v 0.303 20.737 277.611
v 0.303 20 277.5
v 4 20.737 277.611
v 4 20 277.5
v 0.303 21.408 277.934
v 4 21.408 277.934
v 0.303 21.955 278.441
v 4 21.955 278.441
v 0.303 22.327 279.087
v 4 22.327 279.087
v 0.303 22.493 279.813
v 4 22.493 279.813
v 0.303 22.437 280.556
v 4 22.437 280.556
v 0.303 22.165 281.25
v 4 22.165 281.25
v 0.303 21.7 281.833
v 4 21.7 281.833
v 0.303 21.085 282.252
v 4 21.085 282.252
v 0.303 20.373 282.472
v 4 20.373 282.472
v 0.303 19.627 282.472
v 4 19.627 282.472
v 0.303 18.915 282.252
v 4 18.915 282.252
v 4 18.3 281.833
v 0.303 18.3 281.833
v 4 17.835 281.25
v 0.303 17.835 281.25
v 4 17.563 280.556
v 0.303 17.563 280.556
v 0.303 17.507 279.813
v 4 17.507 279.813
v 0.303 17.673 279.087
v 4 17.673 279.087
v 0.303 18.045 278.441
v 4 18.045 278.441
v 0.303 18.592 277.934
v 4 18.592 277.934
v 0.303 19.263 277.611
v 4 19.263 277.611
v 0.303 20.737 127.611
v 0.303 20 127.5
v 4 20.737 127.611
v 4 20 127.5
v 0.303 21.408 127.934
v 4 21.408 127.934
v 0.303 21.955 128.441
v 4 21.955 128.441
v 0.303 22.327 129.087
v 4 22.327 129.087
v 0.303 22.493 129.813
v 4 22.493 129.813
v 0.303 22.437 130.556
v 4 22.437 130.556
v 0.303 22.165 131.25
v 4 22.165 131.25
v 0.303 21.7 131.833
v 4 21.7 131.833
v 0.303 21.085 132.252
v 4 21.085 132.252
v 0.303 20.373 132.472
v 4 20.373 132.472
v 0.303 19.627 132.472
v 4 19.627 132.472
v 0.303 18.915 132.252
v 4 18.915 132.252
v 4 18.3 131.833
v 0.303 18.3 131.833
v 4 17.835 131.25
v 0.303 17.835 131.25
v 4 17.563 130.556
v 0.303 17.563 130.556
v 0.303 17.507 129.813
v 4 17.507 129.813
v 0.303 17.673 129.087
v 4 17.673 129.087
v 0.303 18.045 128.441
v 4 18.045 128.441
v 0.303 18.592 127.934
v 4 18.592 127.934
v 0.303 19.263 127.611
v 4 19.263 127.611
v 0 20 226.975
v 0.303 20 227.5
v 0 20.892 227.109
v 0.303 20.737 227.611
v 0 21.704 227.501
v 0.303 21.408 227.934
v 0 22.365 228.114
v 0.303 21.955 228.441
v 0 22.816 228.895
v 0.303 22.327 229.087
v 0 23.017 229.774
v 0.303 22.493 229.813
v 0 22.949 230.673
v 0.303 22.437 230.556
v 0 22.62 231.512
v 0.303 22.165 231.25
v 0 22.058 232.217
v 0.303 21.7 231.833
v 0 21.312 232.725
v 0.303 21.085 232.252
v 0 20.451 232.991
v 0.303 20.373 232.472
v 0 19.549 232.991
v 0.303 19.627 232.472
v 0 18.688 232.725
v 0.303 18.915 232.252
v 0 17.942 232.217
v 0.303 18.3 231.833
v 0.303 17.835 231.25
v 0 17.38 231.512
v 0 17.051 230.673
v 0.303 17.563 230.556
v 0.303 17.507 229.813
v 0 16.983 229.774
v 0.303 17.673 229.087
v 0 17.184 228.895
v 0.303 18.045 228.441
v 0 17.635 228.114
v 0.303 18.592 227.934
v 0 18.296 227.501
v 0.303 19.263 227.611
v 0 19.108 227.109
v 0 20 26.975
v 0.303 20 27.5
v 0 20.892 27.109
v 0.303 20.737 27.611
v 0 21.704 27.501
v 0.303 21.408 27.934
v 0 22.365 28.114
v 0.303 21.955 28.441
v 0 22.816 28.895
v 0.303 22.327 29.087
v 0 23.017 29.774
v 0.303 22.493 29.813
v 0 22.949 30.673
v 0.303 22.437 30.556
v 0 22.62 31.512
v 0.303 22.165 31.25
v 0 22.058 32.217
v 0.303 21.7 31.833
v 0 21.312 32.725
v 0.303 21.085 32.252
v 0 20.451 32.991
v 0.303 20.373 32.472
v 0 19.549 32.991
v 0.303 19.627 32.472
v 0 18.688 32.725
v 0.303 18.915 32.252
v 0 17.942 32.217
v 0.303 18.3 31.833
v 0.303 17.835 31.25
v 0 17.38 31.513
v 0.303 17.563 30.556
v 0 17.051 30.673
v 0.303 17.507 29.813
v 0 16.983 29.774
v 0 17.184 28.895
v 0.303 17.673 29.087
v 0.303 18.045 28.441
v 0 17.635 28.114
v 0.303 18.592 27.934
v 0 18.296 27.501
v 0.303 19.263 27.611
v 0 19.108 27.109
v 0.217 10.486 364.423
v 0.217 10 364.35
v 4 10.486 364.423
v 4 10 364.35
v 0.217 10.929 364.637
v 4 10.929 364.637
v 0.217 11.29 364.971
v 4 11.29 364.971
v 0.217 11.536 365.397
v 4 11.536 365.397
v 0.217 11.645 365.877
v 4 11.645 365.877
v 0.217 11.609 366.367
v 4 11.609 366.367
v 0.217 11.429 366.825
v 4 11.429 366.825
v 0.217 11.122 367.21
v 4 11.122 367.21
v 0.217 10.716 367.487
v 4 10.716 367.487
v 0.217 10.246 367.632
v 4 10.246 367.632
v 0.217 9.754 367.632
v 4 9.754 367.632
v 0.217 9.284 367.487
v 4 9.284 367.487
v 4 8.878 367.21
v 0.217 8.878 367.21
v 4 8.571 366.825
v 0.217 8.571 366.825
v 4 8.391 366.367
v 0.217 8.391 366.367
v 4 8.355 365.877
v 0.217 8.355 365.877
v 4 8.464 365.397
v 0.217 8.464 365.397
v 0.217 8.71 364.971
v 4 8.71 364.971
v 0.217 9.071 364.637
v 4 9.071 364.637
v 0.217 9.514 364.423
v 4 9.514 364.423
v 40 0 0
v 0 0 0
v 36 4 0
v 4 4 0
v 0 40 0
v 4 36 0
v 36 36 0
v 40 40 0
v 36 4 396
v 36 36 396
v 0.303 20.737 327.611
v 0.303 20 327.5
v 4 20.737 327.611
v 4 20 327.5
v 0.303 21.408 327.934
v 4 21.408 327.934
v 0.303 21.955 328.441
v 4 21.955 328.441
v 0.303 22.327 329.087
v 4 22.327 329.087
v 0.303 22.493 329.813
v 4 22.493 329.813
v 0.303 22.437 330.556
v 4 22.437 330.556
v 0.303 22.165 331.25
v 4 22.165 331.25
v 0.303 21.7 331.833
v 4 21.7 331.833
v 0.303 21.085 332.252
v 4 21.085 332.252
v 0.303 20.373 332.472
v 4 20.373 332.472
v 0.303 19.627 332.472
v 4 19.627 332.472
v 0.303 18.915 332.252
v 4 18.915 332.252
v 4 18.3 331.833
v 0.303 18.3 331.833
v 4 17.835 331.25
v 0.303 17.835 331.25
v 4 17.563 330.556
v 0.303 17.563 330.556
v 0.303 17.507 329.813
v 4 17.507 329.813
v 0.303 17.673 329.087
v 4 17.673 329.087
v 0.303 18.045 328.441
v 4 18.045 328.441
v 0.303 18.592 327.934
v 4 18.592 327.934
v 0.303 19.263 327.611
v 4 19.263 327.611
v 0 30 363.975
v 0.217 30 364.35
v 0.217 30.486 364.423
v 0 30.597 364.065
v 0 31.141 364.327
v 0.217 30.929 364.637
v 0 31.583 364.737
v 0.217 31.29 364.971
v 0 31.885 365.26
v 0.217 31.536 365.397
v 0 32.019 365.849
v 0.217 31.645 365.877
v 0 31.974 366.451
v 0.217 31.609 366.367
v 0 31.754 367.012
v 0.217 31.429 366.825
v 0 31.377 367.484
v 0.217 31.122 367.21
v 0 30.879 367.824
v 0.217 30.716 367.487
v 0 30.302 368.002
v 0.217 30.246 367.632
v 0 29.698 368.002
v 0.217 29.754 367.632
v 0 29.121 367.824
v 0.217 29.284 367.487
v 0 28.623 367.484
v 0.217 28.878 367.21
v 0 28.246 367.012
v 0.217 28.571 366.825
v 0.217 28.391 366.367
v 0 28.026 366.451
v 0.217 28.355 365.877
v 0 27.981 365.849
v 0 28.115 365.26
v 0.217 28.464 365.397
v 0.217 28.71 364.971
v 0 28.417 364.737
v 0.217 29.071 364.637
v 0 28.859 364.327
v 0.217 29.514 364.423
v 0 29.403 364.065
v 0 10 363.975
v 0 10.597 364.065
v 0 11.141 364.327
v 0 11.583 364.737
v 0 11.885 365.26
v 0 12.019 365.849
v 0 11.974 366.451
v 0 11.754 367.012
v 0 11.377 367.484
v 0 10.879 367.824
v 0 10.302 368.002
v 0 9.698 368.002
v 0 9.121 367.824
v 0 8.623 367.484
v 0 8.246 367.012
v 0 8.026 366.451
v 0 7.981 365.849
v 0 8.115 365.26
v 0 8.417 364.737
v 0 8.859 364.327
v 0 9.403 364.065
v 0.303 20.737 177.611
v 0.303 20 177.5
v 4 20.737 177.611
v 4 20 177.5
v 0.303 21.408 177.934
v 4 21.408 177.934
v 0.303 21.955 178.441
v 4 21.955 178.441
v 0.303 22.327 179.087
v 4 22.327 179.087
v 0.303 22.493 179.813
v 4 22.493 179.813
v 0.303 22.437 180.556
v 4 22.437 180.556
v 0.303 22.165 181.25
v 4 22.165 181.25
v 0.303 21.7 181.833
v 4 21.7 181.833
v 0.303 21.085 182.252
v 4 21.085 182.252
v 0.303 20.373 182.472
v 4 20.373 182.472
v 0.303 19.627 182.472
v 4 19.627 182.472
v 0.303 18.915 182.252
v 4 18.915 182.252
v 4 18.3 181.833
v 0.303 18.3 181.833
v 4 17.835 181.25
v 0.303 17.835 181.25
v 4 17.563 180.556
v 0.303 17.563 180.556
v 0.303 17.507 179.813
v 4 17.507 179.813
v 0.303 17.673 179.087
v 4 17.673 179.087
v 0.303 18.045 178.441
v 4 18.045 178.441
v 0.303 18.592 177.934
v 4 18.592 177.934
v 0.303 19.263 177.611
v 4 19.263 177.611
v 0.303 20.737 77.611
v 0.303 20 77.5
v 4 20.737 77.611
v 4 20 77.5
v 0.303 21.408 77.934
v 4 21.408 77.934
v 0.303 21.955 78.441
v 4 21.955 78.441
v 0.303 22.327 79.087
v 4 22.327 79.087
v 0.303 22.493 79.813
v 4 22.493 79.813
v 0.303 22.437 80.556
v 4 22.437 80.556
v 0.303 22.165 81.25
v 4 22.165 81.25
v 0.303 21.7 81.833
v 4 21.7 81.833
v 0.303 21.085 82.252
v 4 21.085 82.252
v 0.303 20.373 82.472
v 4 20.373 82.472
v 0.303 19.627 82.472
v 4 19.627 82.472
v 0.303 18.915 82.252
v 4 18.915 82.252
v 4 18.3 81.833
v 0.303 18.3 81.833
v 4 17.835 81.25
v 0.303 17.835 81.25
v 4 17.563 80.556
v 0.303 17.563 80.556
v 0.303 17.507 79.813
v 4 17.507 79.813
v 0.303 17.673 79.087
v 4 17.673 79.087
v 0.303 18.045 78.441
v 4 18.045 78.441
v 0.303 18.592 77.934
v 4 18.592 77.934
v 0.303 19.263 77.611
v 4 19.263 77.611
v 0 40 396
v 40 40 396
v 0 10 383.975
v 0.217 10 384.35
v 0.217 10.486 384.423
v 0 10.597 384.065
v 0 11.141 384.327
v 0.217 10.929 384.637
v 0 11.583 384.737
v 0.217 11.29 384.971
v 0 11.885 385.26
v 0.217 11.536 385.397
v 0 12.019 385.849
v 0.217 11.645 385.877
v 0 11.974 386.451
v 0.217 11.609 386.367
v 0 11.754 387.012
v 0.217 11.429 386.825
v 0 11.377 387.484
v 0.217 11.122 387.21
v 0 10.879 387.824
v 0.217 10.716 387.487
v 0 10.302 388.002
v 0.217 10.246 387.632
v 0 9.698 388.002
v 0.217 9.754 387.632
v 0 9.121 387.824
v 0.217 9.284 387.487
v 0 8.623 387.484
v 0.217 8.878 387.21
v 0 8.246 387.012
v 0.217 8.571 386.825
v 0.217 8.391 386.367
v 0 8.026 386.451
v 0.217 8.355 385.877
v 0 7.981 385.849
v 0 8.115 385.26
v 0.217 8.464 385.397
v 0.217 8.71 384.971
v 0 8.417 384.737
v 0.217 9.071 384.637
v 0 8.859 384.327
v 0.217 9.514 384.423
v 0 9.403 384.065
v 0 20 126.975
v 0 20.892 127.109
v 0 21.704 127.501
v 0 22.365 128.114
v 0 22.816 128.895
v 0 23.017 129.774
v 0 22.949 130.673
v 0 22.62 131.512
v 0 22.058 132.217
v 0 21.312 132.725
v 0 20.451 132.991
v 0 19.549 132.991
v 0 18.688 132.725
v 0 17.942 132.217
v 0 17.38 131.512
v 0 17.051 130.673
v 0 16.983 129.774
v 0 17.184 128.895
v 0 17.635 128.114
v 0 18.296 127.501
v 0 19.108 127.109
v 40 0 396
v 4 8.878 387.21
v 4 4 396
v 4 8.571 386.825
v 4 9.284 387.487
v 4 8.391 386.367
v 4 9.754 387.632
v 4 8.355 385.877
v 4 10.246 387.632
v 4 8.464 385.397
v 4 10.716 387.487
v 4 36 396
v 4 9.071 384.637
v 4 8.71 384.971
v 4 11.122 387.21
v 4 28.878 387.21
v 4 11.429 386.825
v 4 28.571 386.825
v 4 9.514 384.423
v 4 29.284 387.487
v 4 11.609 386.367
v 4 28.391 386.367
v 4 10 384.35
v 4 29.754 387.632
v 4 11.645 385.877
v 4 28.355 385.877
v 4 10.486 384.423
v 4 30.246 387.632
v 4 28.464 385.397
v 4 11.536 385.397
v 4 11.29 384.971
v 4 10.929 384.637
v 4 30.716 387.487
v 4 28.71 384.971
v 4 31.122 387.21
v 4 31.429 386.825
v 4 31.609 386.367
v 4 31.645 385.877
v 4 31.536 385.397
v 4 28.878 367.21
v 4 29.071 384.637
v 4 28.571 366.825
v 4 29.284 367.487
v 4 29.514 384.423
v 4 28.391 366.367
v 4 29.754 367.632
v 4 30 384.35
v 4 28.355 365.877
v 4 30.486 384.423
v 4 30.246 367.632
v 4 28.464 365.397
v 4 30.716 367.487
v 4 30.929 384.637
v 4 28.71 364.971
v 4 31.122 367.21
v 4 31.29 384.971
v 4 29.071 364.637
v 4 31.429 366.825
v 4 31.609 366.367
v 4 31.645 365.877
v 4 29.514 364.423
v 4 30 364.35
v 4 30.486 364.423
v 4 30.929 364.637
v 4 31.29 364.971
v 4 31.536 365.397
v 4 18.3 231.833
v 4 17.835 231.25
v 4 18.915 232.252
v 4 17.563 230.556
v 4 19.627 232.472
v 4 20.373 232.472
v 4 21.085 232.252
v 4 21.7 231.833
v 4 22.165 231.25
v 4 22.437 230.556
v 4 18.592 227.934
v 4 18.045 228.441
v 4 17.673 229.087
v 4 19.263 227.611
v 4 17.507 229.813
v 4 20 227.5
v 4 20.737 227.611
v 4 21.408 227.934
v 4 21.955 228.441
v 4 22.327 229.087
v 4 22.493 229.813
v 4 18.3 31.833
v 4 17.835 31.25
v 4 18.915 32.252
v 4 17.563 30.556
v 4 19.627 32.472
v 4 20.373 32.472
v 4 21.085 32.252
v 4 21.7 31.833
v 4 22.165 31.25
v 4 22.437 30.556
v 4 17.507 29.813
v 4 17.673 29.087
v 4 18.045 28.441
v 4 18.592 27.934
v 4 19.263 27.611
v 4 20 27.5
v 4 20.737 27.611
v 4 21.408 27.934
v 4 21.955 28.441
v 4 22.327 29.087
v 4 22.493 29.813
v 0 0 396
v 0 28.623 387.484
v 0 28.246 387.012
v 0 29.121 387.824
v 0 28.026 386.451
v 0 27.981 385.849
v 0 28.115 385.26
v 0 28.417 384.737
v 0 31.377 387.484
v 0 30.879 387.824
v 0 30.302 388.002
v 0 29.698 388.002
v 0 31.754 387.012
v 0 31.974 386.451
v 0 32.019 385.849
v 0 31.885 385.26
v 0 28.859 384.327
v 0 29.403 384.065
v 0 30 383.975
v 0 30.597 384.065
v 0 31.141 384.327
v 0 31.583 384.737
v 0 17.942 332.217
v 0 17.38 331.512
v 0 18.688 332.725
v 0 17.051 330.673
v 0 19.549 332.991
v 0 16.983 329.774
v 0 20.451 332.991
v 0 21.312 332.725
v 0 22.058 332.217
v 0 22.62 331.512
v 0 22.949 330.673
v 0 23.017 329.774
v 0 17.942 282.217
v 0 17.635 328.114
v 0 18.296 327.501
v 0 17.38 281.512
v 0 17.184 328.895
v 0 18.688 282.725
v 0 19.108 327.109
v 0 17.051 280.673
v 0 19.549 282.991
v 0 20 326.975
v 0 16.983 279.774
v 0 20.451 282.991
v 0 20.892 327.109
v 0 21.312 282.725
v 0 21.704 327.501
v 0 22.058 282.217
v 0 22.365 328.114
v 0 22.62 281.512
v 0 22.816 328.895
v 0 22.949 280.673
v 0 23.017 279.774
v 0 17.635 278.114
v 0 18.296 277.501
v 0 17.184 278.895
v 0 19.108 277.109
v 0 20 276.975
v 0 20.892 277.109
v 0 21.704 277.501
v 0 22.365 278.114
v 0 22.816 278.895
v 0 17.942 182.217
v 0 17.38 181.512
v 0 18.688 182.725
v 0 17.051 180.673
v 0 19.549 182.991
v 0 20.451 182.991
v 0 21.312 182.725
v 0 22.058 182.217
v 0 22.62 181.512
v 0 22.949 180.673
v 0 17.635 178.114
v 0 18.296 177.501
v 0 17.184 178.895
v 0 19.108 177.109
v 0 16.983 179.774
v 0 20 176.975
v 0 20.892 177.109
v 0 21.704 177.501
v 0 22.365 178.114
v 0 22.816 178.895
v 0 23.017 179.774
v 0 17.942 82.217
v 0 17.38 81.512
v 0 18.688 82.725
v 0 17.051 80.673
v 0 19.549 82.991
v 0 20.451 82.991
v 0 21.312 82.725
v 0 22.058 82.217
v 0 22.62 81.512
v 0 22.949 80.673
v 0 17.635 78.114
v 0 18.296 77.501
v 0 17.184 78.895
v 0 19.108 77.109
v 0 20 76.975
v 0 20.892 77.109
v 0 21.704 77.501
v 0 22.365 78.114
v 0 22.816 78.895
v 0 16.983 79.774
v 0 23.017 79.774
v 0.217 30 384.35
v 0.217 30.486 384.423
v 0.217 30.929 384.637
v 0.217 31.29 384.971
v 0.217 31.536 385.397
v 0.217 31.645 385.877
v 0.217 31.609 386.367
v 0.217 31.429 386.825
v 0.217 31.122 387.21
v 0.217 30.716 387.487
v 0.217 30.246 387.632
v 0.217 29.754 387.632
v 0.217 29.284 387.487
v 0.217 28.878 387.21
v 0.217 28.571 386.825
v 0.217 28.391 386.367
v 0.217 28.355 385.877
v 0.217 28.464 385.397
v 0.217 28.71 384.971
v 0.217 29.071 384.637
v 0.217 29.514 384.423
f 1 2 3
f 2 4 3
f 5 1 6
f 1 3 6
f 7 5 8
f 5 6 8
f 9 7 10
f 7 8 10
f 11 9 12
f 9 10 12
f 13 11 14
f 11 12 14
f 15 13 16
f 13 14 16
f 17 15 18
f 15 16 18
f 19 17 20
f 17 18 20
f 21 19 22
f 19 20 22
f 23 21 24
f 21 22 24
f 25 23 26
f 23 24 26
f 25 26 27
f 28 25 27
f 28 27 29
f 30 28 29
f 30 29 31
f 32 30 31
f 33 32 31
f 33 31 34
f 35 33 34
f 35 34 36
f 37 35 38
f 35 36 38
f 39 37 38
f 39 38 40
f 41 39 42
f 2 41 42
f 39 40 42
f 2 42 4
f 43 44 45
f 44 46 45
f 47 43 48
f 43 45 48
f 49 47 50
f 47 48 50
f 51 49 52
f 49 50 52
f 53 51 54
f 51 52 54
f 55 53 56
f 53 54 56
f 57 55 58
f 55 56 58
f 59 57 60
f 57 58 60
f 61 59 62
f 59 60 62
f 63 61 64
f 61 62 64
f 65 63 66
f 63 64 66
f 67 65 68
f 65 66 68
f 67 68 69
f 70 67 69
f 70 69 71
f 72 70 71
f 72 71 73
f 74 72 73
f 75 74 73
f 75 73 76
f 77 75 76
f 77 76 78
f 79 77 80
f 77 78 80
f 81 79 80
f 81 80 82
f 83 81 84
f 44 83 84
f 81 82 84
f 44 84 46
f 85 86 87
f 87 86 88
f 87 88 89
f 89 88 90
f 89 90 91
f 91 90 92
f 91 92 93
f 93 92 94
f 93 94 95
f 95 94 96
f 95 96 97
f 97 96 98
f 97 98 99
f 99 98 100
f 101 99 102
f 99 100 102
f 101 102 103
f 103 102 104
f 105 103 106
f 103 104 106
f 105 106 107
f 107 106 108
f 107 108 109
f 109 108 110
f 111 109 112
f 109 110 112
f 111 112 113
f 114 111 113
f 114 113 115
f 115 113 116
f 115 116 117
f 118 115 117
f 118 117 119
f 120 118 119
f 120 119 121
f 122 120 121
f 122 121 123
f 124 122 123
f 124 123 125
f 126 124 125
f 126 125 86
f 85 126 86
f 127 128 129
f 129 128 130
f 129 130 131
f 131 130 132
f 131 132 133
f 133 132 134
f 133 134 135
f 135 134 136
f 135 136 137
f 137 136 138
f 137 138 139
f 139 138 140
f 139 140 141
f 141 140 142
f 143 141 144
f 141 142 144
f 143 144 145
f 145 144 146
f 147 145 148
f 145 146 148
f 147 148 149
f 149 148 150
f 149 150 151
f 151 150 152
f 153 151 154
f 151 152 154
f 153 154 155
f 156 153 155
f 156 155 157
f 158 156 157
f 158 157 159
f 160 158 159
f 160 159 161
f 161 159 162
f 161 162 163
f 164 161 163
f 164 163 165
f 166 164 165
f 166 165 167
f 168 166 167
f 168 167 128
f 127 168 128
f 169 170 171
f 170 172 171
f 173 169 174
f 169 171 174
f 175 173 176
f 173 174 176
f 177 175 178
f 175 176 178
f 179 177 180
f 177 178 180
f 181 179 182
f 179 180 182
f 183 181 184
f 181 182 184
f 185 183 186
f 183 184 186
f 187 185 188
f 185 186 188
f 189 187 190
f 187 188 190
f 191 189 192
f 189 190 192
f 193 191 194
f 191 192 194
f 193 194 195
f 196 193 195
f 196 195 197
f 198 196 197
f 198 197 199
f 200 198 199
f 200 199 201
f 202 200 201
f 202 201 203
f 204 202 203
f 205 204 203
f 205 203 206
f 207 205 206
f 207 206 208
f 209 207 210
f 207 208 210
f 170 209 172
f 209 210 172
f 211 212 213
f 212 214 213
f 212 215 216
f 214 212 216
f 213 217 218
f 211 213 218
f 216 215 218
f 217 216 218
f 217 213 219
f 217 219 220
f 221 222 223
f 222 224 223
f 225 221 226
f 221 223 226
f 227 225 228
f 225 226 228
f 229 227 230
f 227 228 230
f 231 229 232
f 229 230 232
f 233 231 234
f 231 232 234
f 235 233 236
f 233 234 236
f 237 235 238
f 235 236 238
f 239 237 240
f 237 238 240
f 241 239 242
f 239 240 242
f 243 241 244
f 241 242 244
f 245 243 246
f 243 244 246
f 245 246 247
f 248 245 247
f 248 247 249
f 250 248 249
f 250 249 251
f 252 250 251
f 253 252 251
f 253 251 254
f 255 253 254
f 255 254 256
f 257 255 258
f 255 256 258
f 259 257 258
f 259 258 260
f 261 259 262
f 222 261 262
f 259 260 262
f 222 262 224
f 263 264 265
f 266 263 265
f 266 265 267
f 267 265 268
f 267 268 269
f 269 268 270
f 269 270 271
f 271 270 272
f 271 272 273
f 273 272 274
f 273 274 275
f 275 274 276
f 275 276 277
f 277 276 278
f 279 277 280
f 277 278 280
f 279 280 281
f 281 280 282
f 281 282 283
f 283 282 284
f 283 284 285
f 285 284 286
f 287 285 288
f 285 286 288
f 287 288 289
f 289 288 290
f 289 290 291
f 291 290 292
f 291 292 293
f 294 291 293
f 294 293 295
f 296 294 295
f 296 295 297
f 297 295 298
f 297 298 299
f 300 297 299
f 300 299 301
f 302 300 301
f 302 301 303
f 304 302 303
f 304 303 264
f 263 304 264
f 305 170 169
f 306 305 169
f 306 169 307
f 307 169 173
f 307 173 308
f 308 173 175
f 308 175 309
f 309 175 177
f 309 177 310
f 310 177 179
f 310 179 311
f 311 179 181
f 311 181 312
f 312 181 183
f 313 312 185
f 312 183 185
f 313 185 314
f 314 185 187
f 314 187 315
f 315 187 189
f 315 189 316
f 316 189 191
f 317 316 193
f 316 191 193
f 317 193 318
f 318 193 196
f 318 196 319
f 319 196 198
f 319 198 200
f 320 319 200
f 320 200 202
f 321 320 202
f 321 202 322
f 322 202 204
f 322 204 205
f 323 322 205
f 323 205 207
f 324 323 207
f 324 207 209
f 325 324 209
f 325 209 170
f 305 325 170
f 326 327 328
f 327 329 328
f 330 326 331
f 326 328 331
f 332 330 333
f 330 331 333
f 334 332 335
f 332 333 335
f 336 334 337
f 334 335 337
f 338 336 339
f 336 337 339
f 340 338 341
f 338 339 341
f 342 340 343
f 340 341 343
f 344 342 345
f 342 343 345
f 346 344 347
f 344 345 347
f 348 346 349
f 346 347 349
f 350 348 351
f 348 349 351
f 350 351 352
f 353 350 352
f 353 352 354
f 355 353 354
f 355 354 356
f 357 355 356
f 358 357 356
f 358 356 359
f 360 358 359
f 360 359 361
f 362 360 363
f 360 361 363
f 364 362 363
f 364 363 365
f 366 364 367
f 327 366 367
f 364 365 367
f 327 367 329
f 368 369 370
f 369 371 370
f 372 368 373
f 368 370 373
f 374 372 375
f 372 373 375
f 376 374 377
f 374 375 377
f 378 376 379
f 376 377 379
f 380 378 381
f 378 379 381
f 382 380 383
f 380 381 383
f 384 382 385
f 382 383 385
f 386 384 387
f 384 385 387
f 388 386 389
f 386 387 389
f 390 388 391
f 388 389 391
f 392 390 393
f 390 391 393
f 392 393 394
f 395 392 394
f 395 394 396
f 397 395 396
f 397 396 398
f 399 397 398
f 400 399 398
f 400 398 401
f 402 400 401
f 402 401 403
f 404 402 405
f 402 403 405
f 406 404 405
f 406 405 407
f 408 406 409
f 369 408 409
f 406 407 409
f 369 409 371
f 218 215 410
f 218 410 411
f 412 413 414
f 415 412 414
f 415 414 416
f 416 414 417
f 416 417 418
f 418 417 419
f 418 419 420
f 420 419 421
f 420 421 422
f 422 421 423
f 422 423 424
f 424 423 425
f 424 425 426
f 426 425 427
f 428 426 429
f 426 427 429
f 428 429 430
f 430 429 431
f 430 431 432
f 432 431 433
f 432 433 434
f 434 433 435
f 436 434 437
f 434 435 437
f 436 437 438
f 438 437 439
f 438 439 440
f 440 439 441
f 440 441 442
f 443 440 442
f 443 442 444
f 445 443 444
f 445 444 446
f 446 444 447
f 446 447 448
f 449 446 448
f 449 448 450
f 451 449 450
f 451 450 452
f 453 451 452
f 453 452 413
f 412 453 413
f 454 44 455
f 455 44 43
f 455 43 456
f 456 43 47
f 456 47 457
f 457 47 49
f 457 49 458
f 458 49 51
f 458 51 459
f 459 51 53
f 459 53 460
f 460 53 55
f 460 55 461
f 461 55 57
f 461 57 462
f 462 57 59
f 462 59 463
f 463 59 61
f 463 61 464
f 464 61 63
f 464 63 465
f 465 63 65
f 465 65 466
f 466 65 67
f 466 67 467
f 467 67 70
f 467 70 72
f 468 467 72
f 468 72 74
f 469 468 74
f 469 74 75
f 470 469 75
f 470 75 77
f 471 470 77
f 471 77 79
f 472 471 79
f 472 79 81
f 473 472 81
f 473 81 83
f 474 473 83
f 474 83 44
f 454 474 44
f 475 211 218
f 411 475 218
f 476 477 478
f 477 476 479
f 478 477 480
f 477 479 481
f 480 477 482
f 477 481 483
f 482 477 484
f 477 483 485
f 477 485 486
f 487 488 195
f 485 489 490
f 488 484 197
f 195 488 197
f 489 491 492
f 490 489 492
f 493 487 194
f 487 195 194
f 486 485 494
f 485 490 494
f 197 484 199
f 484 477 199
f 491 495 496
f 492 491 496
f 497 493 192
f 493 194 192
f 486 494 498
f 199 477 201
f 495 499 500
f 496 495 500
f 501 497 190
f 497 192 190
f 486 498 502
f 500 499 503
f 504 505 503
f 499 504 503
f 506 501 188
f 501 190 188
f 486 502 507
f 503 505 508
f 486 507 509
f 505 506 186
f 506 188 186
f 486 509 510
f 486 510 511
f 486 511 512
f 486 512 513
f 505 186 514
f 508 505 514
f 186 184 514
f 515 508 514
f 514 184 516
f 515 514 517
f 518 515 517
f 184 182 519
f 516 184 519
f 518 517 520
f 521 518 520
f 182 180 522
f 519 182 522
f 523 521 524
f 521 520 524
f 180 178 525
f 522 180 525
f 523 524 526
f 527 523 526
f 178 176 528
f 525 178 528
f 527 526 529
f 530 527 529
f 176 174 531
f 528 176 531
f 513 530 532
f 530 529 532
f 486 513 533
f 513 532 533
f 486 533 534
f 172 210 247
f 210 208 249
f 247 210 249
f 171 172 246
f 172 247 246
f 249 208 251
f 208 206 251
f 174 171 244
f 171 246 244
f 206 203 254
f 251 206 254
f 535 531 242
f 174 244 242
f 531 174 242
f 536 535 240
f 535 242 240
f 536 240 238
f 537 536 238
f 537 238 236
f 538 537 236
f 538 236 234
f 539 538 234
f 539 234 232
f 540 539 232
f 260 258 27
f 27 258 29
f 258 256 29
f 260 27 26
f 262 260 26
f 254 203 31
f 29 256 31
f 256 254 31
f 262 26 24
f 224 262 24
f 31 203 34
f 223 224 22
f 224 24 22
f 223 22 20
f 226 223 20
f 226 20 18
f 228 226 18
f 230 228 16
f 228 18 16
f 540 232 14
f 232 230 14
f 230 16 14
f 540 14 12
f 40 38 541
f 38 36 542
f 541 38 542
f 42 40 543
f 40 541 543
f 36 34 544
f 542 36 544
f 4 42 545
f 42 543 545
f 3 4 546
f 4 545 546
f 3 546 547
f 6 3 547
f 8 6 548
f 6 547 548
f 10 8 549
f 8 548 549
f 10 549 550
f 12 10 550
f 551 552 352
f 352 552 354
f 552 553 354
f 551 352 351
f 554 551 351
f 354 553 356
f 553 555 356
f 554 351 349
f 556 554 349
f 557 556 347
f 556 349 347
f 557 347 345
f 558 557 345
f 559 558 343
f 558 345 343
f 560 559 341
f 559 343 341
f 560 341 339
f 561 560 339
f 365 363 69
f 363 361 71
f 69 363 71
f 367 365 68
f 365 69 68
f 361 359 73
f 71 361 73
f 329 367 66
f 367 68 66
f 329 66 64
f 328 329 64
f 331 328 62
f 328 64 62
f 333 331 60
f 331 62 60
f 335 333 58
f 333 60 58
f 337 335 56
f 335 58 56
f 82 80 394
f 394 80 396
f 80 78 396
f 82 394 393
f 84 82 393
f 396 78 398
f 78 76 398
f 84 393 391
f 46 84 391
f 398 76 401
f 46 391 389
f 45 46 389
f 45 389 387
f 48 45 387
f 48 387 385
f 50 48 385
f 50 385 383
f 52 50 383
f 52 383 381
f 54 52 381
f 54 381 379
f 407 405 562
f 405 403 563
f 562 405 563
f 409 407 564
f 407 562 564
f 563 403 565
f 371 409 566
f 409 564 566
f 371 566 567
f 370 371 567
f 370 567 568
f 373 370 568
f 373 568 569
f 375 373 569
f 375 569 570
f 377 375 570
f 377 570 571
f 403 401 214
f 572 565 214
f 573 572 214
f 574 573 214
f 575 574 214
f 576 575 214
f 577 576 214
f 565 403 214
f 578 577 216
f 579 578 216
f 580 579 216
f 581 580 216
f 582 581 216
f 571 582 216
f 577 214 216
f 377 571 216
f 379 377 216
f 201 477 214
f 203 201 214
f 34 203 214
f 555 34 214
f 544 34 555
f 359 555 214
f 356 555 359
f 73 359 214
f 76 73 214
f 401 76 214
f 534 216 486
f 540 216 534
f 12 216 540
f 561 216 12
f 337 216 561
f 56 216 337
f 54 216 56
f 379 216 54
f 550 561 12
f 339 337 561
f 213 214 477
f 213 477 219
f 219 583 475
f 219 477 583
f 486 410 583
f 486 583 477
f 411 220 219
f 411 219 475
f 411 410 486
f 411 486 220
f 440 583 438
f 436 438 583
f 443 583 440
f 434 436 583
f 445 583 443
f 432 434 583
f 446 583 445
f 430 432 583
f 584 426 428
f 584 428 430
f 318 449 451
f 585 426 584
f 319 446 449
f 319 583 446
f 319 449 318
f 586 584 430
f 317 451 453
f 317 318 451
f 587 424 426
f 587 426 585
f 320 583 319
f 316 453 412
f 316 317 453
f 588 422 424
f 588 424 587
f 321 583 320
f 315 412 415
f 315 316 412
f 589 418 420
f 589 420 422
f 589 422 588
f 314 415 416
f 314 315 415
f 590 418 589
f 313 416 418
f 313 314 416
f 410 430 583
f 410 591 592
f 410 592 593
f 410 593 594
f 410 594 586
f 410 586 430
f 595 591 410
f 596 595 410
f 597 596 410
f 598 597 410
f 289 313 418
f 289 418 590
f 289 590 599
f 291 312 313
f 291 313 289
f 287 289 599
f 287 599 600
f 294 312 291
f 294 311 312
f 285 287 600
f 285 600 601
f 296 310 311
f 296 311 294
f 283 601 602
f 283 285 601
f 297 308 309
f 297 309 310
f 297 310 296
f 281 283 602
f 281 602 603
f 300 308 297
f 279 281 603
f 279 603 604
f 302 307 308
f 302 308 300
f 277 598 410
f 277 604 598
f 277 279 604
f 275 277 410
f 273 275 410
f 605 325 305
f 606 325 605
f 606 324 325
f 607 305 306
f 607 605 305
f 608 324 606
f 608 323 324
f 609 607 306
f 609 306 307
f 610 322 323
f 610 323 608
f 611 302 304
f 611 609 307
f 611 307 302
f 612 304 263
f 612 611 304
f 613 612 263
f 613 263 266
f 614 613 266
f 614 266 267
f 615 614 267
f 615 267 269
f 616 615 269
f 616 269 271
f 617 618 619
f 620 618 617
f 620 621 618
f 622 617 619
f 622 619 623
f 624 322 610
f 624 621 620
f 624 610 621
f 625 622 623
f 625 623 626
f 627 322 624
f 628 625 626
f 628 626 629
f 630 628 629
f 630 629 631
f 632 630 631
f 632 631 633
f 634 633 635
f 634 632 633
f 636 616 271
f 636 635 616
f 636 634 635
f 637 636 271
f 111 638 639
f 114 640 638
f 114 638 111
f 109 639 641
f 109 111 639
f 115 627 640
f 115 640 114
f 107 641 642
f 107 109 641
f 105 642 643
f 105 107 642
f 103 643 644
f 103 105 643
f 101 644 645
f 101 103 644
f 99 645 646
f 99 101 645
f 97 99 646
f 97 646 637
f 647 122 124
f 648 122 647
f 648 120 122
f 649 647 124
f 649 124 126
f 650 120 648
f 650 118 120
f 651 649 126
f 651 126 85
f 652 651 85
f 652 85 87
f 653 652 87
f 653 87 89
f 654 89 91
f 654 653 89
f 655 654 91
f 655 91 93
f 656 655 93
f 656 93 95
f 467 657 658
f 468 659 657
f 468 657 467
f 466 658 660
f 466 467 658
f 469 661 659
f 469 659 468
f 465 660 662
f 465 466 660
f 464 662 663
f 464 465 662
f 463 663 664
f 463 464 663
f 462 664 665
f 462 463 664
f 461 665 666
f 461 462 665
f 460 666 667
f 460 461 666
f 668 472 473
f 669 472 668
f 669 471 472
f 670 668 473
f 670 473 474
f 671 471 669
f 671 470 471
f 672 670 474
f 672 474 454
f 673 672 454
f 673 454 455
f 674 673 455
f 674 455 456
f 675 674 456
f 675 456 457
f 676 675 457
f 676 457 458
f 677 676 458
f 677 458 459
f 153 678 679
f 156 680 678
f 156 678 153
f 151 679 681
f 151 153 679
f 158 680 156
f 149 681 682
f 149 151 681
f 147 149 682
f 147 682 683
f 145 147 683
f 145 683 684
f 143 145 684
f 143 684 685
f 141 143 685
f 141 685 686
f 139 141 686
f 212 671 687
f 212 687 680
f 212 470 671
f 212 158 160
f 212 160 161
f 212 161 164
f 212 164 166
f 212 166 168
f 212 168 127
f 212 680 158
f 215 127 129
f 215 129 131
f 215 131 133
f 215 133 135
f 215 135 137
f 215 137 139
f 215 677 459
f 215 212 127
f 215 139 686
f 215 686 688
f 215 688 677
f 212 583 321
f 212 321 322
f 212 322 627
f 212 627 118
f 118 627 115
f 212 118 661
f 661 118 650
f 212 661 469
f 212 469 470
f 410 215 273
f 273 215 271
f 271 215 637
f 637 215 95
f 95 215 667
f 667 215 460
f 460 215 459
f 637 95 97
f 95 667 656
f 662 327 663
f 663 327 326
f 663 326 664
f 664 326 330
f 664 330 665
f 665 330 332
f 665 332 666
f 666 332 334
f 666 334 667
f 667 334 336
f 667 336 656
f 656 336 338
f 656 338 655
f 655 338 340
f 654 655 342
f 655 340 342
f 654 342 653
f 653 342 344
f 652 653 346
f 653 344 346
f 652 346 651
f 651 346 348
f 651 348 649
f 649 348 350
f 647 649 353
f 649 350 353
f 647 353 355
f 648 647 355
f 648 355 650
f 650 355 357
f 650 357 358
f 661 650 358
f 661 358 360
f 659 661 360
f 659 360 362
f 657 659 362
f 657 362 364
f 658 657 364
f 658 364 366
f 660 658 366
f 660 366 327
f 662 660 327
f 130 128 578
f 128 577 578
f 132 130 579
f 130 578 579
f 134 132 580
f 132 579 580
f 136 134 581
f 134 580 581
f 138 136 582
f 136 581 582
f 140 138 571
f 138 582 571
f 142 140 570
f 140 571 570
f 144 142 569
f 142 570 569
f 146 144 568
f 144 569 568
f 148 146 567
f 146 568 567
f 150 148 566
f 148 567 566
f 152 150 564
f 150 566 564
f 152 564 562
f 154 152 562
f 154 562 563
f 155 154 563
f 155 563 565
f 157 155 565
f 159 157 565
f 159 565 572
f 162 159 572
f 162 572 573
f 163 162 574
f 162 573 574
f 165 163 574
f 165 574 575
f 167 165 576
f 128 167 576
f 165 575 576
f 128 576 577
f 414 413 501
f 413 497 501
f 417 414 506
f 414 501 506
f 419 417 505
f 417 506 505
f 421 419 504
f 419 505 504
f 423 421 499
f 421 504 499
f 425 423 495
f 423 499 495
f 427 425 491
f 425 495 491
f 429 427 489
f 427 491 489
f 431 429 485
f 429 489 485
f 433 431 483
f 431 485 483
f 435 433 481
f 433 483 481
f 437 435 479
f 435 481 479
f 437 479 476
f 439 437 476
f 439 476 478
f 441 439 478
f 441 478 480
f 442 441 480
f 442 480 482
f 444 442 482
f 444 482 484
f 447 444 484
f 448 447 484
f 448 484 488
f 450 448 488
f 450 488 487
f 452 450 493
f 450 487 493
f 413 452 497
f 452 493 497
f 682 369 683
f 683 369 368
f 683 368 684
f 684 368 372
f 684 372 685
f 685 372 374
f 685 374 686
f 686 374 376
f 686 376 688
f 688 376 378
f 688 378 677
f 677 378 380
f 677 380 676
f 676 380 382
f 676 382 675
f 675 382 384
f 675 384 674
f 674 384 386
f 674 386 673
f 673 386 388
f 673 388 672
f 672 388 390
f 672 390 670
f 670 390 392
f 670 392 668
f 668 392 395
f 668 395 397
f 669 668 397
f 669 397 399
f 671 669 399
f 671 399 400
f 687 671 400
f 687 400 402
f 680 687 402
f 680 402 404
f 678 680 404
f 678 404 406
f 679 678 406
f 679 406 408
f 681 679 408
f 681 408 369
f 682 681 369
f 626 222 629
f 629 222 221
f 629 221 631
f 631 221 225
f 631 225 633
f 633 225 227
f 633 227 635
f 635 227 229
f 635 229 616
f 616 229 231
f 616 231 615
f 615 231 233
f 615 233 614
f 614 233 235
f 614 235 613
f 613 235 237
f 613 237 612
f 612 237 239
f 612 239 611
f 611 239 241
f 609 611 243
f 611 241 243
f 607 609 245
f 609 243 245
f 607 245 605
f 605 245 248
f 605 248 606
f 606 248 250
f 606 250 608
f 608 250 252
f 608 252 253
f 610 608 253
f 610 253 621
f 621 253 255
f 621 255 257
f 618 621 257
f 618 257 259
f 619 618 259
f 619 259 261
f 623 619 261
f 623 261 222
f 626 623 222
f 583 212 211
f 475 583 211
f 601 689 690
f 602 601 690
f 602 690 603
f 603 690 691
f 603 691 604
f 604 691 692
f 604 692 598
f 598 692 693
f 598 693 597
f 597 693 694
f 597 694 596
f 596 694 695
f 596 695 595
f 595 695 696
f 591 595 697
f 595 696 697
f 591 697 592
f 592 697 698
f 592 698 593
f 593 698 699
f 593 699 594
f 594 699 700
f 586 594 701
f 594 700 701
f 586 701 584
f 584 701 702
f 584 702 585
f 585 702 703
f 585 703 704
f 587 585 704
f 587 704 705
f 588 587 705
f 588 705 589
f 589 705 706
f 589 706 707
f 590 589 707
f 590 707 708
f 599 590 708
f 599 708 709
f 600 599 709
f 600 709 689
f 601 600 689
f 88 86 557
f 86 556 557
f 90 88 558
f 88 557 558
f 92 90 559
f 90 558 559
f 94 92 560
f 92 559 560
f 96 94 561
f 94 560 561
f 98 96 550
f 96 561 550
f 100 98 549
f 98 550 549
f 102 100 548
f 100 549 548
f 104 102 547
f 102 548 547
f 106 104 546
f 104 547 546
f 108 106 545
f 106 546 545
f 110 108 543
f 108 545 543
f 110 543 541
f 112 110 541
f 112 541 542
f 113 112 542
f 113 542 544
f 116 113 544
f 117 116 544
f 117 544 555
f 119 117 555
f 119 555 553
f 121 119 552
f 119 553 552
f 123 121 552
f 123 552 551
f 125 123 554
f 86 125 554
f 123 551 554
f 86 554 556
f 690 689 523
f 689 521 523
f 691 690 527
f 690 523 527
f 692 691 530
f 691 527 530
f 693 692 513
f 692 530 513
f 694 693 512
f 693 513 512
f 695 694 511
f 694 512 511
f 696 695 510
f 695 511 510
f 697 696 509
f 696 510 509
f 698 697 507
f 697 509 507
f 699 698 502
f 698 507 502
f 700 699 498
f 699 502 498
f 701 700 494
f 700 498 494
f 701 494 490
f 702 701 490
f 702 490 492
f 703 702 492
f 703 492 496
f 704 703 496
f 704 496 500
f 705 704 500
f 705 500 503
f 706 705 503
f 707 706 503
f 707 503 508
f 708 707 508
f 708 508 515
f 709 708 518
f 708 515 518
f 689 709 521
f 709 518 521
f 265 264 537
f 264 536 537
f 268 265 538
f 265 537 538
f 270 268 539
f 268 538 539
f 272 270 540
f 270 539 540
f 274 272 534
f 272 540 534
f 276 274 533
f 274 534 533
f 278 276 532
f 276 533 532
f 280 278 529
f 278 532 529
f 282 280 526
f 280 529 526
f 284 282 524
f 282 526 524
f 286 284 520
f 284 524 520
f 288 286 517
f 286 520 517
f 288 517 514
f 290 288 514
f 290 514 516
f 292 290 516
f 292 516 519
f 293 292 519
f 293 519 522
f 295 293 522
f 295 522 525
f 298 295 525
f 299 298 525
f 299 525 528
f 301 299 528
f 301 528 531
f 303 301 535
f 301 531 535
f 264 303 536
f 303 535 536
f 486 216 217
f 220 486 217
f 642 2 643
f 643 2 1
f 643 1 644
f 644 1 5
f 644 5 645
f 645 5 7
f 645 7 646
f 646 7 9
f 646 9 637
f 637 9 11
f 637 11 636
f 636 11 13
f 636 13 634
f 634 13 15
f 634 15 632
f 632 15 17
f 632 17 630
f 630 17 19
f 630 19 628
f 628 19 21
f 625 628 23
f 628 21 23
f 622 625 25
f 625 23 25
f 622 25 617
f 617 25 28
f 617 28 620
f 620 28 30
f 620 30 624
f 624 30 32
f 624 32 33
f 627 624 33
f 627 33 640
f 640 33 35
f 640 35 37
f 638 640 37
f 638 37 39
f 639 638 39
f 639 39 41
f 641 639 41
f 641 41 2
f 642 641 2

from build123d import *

# Parameters (mm, degrees)
SKETCH_1_W                  = 40
SKETCH_1_H                  = 40
SKETCH_1_W_2                = 32
SKETCH_1_H_2                = 32
EXTRUDE_1_DEPTH             = 396
HOLE_WIZARD_M61_D           = 5
HOLE_WIZARD_M61_DEPTH       = 17
HOLE_WIZARD_M61_CSINK_D     = 6.05
HOLE_WIZARD_M61_CSINK_ANGLE = 120
HOLE_WIZARD_M61_TIP         = 1.502151548
HOLE_WIZARD_M41_D           = 3.3
HOLE_WIZARD_M41_DEPTH       = 11.5
HOLE_WIZARD_M41_CSINK_D     = 4.05
HOLE_WIZARD_M41_CSINK_ANGLE = 120
HOLE_WIZARD_M41_TIP         = 0.991420021


with BuildPart() as part:
    # Эскиз1 → Вытянуть-Тонкостенный1 (new body)
    with BuildSketch(Plane.XY):
        with Locations((20, 20)):
            Rectangle(SKETCH_1_W, SKETCH_1_H)
        with Locations((20, 20)):
            Rectangle(SKETCH_1_W_2, SKETCH_1_H_2, mode=Mode.SUBTRACT)
    extrude(amount=EXTRUDE_1_DEPTH)

    # Отверстие обработанное метчиком M61
    with Locations(Plane.ZY):
        with Locations((30, 20), (80, 20), (130, 20), (180, 20), (230, 20), (280, 20), (330, 20)):
            CounterSinkHole(HOLE_WIZARD_M61_D / 2, HOLE_WIZARD_M61_CSINK_D / 2, depth=HOLE_WIZARD_M61_DEPTH, counter_sink_angle=HOLE_WIZARD_M61_CSINK_ANGLE)
            with Locations((0, 0, -(HOLE_WIZARD_M61_DEPTH + HOLE_WIZARD_M61_TIP / 2))):  # 118° drill point
                Cone(0, HOLE_WIZARD_M61_D / 2, HOLE_WIZARD_M61_TIP, mode=Mode.SUBTRACT)

    # Отверстие обработанное метчиком M41
    with Locations(Plane.ZY):
        with Locations((386, 10), (366, 10), (386, 30), (366, 30)):
            CounterSinkHole(HOLE_WIZARD_M41_D / 2, HOLE_WIZARD_M41_CSINK_D / 2, depth=HOLE_WIZARD_M41_DEPTH, counter_sink_angle=HOLE_WIZARD_M41_CSINK_ANGLE)
            with Locations((0, 0, -(HOLE_WIZARD_M41_DEPTH + HOLE_WIZARD_M41_TIP / 2))):  # 118° drill point
                Cone(0, HOLE_WIZARD_M41_D / 2, HOLE_WIZARD_M41_TIP, mode=Mode.SUBTRACT)


solid = part.part
